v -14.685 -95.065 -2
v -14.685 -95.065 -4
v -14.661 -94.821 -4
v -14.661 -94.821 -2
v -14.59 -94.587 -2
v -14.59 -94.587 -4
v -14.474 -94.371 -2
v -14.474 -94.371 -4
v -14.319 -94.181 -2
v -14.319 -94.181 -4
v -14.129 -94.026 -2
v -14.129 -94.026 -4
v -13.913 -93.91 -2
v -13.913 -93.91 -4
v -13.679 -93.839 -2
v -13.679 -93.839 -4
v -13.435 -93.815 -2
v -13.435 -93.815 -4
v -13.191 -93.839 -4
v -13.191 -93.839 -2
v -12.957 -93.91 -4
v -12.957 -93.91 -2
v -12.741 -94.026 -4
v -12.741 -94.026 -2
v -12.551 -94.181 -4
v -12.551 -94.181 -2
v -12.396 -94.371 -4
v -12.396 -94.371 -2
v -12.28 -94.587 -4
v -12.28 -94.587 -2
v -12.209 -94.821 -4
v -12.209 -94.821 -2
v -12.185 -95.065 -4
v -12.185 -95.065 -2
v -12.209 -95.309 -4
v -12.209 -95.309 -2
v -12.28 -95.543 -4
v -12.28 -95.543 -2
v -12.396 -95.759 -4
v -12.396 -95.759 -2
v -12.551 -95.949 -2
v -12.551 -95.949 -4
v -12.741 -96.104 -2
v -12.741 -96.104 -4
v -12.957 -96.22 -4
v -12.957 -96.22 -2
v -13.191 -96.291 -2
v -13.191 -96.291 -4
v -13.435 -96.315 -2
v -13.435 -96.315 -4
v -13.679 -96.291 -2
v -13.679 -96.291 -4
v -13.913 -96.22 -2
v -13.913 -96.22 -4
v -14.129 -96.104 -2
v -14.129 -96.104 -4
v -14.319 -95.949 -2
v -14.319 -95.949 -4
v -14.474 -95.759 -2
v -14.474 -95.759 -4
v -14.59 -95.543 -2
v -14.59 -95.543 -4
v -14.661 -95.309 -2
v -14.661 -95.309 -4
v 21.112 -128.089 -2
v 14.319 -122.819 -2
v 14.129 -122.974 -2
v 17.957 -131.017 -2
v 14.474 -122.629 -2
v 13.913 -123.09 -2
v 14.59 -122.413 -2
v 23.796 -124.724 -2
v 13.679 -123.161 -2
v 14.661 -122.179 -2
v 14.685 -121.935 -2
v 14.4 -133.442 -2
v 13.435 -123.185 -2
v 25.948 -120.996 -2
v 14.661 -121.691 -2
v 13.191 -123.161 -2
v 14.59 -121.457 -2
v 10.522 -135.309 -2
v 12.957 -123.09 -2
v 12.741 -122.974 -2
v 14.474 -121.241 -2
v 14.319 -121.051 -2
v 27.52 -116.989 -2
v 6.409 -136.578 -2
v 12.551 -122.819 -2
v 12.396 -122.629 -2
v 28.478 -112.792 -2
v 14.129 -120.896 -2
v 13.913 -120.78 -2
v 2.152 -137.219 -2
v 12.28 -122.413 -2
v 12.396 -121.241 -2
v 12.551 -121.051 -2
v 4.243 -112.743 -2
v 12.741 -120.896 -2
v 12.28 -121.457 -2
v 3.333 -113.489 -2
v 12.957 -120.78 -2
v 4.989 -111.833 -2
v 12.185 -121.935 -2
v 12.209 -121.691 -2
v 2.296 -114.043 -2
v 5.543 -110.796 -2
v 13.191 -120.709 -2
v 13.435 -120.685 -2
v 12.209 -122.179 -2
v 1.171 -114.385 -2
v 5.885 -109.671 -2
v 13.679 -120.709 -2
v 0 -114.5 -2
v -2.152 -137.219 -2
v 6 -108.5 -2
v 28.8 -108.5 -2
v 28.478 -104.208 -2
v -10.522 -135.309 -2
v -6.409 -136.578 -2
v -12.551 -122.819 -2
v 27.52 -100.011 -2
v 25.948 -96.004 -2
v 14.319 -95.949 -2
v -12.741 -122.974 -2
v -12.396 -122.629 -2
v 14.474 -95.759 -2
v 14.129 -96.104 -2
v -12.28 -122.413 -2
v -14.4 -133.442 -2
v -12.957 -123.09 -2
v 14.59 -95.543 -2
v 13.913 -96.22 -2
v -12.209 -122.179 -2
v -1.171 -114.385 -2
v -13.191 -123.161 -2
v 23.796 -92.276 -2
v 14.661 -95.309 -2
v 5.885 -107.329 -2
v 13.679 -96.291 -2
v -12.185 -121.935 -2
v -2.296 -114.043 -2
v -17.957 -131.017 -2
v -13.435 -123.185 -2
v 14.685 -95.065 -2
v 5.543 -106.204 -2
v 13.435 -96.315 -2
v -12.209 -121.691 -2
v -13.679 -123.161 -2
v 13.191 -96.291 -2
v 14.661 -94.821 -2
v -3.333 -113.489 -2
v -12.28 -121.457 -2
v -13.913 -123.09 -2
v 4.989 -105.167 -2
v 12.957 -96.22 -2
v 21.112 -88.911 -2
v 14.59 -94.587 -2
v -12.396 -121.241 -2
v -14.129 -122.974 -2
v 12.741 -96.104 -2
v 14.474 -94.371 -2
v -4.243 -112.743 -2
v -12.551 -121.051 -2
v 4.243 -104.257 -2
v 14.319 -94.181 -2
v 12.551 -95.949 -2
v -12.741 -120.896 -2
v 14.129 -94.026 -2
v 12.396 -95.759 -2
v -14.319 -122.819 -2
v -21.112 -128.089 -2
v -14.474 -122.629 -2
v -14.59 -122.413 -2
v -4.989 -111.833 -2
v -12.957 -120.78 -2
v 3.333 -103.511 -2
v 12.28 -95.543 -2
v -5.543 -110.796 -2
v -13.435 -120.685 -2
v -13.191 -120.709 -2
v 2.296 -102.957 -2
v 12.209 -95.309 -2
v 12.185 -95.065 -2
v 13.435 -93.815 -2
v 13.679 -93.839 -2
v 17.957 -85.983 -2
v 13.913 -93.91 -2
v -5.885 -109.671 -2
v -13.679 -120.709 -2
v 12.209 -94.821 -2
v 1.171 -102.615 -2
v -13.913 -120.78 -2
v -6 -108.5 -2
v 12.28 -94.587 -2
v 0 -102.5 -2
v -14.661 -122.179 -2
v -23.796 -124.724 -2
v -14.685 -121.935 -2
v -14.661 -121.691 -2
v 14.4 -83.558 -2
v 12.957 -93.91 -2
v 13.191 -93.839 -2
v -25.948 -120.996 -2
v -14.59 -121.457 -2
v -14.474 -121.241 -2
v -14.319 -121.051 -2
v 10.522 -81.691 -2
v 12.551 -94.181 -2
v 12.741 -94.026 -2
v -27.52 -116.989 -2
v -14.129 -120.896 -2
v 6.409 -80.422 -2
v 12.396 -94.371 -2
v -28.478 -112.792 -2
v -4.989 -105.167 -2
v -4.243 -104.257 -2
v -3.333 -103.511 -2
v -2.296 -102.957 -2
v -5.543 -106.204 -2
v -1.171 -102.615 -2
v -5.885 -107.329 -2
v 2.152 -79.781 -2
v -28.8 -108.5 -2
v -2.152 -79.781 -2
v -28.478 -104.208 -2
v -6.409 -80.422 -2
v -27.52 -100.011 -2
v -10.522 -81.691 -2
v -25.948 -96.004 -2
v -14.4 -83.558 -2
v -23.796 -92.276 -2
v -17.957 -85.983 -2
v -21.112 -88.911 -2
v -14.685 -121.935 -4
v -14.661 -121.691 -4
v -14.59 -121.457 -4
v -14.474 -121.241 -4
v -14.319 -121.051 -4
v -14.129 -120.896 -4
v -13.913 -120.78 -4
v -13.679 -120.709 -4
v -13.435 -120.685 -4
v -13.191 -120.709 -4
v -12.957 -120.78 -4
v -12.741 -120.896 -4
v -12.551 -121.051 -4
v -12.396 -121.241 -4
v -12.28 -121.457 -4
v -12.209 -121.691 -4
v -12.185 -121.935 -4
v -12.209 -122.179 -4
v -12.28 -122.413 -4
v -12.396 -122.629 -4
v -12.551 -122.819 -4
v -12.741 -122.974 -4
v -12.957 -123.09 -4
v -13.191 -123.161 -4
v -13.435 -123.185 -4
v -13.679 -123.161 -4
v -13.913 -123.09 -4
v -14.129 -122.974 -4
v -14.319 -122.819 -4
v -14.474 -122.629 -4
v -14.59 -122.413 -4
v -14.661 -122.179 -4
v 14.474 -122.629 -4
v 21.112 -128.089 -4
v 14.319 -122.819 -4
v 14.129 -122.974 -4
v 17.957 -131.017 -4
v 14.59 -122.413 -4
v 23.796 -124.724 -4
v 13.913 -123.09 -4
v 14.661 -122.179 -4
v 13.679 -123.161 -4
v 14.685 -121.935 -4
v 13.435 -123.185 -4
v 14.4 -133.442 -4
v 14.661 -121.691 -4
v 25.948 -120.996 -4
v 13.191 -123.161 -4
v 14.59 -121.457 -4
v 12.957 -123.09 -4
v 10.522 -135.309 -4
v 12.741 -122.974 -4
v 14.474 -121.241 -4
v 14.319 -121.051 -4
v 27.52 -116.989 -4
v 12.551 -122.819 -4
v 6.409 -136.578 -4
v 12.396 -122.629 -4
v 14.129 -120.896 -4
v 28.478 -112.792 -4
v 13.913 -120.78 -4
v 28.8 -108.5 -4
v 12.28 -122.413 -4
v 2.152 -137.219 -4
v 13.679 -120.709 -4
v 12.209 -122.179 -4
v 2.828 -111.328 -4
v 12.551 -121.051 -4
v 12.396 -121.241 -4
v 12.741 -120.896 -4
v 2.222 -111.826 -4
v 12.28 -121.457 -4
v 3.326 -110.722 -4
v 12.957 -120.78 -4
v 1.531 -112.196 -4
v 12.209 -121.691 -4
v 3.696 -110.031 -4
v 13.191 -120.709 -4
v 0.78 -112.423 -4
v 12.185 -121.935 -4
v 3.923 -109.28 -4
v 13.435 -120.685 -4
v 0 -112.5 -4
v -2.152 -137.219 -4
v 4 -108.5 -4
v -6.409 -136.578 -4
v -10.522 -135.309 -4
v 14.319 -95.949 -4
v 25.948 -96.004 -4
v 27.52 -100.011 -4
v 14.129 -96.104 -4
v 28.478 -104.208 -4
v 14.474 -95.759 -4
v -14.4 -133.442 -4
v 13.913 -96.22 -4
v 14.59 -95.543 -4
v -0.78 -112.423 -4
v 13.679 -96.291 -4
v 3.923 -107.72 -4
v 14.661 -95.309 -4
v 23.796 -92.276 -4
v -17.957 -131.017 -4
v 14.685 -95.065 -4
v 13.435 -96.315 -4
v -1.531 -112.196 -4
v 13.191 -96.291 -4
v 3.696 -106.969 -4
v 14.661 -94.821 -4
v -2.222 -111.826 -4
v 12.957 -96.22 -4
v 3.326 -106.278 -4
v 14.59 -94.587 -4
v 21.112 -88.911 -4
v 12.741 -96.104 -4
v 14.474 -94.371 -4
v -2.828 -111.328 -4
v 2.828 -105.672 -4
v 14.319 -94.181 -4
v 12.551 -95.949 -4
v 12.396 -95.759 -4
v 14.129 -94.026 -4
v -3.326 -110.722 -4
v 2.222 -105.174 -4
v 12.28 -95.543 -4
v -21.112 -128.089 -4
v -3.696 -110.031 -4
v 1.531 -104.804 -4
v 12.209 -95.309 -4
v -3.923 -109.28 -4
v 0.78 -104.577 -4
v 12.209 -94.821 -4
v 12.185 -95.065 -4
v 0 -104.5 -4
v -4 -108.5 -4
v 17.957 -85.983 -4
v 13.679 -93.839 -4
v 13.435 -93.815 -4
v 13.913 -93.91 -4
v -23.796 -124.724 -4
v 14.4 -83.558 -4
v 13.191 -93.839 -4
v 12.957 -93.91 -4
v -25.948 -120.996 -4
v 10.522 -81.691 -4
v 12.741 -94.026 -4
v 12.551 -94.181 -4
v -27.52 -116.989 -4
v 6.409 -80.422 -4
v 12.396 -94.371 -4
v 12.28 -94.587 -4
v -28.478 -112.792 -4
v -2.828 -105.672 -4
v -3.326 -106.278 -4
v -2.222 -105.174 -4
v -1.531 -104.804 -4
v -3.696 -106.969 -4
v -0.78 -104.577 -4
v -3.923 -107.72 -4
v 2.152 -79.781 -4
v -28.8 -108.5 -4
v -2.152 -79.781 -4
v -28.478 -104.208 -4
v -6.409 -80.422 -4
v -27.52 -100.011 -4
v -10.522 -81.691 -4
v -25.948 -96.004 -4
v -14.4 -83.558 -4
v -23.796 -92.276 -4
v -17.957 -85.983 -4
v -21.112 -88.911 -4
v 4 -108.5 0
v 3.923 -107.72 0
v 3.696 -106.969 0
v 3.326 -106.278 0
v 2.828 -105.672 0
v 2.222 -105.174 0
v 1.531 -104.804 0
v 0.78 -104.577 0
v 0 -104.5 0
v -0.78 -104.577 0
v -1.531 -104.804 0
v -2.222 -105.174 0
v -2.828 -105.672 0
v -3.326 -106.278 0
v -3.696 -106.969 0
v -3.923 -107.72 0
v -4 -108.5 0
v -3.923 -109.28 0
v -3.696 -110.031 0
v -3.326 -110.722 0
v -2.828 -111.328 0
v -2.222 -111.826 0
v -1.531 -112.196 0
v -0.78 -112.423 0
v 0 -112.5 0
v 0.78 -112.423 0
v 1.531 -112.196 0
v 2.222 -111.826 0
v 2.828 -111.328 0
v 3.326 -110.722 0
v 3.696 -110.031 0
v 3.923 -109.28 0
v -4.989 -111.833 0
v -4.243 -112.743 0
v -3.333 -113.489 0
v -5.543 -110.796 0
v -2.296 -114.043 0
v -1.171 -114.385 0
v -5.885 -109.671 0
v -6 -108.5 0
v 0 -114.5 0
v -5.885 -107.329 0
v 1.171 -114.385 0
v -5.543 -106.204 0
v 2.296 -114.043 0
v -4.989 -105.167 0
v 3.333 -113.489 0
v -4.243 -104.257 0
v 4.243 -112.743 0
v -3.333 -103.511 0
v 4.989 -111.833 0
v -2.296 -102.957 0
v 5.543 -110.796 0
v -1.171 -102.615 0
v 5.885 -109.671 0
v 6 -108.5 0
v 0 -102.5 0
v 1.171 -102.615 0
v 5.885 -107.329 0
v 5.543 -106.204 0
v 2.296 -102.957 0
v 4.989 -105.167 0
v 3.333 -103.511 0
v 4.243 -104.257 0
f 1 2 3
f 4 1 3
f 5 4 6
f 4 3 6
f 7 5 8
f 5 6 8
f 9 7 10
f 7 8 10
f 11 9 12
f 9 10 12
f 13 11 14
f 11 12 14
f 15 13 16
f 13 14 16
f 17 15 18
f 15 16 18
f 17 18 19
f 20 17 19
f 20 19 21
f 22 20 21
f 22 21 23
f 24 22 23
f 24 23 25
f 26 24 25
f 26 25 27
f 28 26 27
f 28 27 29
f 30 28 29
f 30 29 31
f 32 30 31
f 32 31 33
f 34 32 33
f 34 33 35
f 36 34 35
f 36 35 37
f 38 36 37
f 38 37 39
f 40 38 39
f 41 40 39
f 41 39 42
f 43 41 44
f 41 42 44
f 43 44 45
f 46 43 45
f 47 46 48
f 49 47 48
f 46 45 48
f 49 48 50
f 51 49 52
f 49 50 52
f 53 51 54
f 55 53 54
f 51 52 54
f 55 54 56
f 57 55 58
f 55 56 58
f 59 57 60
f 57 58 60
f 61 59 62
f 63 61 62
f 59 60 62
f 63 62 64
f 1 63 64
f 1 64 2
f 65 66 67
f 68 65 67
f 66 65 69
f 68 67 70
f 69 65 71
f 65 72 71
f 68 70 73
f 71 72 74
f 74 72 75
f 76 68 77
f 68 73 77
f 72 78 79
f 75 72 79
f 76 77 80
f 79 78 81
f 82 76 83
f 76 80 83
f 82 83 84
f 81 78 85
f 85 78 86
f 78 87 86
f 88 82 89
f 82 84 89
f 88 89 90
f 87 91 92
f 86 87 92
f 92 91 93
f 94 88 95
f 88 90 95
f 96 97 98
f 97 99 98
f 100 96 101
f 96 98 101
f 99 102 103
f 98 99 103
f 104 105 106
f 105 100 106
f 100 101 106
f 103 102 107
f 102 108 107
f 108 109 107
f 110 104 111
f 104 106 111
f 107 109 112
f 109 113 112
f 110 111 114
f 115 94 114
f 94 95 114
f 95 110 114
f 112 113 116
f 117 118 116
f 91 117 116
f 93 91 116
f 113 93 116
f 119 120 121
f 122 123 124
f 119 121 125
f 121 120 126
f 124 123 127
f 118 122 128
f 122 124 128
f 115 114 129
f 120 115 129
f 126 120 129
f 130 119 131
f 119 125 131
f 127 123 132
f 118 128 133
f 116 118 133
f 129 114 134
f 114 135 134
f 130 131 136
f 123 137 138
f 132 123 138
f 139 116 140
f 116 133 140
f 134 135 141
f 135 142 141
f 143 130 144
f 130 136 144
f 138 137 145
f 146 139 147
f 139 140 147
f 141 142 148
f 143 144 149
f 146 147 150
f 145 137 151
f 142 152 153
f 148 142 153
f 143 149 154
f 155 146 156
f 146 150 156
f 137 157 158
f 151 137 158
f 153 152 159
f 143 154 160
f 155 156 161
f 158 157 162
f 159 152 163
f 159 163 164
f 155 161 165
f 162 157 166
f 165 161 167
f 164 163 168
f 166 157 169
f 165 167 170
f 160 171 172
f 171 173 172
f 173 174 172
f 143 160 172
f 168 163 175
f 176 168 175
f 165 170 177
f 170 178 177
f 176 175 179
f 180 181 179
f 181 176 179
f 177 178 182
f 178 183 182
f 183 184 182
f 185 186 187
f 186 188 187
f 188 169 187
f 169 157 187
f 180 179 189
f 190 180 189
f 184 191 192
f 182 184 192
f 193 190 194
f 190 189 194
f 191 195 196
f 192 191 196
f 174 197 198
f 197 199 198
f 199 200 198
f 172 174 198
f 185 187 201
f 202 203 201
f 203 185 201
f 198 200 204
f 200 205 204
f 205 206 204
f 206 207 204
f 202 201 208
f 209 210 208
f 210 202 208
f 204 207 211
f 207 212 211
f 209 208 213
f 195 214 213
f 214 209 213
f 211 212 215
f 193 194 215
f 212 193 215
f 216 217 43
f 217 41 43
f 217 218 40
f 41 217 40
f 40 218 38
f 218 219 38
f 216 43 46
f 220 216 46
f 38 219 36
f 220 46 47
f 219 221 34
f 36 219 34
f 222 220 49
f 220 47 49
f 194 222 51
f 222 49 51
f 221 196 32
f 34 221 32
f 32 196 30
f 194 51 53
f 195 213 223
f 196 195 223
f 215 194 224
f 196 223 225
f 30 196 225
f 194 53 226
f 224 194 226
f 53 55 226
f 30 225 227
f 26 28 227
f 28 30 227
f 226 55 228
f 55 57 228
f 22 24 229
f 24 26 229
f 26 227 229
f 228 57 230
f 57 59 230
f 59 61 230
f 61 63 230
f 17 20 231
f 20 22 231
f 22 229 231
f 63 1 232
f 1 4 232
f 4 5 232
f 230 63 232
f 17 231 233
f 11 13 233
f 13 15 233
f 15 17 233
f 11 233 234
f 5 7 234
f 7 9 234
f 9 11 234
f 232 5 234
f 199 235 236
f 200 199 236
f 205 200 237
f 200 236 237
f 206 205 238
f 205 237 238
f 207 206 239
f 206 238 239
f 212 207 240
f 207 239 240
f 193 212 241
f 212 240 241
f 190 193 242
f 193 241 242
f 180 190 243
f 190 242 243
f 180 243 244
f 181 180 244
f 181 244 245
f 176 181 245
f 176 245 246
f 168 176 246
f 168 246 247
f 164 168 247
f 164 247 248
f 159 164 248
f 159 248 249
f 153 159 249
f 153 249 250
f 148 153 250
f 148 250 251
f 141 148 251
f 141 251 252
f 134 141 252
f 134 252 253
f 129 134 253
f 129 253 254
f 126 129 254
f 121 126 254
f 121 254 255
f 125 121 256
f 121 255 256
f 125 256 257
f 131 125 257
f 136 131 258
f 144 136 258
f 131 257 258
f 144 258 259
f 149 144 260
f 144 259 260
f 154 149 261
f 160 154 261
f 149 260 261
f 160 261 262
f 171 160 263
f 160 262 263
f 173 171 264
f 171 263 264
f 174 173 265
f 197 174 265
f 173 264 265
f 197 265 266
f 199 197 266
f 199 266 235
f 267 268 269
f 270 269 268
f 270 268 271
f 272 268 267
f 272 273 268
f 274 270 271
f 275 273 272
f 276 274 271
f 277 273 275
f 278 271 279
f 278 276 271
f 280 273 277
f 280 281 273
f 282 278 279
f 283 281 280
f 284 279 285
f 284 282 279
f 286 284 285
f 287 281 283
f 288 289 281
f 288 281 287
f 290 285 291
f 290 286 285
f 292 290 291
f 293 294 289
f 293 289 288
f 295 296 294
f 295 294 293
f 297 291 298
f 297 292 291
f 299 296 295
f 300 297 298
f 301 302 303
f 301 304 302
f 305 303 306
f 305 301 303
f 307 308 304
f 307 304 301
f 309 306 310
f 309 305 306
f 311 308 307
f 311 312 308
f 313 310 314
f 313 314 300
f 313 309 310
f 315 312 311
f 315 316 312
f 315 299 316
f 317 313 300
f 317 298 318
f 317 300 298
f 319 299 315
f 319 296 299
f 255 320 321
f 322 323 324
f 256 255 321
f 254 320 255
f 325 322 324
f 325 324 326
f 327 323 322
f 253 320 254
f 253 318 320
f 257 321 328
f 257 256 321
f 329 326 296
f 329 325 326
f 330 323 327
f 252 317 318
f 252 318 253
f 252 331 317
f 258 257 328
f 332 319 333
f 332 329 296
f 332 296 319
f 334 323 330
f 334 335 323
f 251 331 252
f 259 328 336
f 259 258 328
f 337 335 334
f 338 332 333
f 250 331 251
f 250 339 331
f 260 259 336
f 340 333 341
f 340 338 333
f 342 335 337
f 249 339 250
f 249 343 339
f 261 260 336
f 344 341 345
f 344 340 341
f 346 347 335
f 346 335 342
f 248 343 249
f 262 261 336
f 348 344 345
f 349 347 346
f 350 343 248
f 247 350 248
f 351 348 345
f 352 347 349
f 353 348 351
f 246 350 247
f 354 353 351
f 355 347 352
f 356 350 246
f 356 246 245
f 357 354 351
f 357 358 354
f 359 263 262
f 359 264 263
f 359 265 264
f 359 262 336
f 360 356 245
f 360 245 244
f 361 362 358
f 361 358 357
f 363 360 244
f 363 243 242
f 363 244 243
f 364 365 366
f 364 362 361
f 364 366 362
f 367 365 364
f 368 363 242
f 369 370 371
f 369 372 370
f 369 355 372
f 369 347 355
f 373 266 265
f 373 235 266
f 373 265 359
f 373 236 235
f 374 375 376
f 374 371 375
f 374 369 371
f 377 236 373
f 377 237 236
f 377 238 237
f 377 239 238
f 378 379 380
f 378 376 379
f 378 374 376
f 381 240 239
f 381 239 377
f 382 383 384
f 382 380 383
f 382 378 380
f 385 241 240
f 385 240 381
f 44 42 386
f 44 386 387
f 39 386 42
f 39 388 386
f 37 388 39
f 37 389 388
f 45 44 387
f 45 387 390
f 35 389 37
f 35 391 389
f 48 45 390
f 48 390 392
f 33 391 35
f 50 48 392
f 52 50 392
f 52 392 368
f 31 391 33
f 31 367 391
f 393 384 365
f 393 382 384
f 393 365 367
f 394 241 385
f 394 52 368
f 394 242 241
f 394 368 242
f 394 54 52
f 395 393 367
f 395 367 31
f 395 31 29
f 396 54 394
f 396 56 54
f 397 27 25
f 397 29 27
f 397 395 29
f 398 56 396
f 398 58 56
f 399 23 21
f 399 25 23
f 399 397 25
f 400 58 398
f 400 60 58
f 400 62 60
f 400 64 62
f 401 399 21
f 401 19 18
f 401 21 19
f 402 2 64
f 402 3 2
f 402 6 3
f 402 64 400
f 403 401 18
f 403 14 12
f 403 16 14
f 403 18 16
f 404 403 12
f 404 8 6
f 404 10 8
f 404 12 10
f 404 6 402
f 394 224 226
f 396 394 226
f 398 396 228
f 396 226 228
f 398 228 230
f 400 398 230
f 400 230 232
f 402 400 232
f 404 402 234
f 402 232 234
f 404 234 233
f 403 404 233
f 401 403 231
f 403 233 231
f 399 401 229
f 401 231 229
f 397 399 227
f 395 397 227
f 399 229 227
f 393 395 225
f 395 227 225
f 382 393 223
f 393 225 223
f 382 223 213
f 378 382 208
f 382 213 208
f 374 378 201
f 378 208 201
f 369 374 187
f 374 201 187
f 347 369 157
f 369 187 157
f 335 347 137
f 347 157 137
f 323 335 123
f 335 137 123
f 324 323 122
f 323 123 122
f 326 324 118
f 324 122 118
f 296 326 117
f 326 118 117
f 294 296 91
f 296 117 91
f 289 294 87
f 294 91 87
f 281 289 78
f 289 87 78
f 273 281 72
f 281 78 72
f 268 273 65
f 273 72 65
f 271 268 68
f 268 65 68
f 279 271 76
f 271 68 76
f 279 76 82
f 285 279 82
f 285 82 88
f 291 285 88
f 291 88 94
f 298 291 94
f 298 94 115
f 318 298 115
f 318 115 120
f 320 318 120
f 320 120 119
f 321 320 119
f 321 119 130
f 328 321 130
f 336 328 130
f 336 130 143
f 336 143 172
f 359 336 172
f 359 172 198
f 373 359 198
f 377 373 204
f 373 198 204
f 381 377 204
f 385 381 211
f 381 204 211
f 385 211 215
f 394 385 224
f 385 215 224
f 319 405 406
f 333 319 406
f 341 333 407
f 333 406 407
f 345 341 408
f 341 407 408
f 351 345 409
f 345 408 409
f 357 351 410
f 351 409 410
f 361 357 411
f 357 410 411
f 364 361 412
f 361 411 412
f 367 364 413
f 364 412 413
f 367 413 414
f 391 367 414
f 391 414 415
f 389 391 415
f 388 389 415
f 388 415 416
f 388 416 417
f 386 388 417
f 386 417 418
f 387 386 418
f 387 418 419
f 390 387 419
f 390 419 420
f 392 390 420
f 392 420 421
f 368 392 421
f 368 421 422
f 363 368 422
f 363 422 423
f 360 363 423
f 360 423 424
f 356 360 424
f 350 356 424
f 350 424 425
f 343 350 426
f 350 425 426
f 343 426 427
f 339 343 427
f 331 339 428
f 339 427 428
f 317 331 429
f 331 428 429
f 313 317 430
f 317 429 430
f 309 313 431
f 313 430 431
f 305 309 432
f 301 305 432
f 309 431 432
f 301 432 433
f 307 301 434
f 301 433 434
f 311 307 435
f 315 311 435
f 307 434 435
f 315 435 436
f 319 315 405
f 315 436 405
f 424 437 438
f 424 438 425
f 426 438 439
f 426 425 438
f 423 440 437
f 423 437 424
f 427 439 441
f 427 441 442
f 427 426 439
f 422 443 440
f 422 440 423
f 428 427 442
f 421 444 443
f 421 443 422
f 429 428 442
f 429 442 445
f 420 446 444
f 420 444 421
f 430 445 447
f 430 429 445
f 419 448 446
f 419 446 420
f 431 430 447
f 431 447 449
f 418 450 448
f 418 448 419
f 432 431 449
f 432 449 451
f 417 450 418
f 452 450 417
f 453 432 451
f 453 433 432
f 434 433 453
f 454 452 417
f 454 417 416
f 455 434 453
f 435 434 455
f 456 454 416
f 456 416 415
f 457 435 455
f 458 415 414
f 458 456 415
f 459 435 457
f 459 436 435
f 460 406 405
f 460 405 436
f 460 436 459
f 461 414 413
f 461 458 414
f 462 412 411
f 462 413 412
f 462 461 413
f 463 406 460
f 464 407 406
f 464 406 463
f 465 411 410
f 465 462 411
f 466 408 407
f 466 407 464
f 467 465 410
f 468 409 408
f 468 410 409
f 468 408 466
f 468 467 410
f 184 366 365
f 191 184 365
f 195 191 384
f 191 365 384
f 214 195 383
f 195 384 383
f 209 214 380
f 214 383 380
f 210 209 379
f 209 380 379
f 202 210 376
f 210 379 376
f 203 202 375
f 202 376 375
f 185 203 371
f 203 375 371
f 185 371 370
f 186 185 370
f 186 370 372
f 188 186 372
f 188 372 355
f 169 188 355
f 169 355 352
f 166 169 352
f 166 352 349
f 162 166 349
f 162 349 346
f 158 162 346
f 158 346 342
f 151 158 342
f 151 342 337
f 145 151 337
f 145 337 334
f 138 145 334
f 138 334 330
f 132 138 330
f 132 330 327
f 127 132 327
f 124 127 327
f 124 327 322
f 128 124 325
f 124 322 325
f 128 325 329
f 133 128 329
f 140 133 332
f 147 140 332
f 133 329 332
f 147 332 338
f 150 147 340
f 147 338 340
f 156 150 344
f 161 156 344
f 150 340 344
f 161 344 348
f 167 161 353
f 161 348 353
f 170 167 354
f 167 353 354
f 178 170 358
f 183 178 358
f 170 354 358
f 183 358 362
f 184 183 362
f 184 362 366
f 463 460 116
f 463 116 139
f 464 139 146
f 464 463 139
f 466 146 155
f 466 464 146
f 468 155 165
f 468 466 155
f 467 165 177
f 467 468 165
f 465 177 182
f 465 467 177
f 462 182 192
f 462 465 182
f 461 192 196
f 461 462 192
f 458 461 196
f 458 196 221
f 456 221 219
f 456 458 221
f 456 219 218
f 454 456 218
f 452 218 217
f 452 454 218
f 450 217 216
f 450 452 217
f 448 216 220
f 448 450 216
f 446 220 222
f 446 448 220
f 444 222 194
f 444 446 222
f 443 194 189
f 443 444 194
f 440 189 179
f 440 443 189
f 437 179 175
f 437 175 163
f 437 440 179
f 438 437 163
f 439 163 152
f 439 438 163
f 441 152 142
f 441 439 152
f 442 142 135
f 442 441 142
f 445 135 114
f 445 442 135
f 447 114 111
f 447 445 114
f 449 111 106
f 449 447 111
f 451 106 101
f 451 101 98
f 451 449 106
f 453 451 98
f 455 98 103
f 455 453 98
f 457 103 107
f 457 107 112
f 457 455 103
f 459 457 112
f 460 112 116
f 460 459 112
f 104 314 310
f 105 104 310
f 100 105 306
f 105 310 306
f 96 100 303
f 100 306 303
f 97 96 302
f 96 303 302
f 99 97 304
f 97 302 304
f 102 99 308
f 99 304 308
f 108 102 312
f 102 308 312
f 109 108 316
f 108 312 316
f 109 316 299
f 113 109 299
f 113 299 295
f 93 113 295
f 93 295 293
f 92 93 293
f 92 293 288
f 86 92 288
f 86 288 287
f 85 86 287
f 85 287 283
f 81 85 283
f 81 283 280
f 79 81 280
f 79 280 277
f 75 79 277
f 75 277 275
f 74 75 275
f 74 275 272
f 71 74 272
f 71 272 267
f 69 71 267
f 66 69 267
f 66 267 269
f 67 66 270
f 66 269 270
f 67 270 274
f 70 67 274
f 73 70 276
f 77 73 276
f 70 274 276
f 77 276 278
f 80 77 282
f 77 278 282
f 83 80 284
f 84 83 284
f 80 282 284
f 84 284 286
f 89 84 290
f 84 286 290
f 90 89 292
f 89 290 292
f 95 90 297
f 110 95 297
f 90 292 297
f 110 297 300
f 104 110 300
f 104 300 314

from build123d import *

# Parameters (mm, degrees)
SKETCH1_R             = 6
BOSS_EXTRUDE1_DEPTH   = 2
SKETCH2_R             = 28.8
BOSS_EXTRUDE2_DEPTH   = 2
SKETCH3_R             = 4
CUT_EXTRUDE1_DEPTH    = 5
M3X0_5_TAPPED_HOLE1_D = 2.5


with BuildPart() as part:
    # Sketch1 → Boss-Extrude1 (new body)
    with BuildSketch(Plane.XY):
        with Locations((0, -108.5)):
            Circle(SKETCH1_R)
    extrude(amount=-BOSS_EXTRUDE1_DEPTH)

    # Sketch2 → Boss-Extrude2 (add)
    with BuildSketch(Plane(origin=(0, 0, -2), x_dir=(-1, 0, 0), z_dir=(0, 0, -1))):
        with Locations((0, -108.5)):
            Circle(SKETCH2_R)
    extrude(amount=BOSS_EXTRUDE2_DEPTH)

    # Sketch3 → Cut-Extrude1 (cut, through all)
    with BuildSketch(Plane.XY):
        with Locations((0, -108.5)):
            Circle(SKETCH3_R)
    extrude(amount=-CUT_EXTRUDE1_DEPTH, mode=Mode.SUBTRACT)

    # M3x0.5 Tapped Hole1 (through all)
    with Locations(Plane.XY.offset(-2)):
        with Locations((-13.435028843, -95.064971157), (13.435028843, -95.064971157), (13.435028843, -121.935028843), (-13.435028843, -121.935028843)):
            Hole(M3X0_5_TAPPED_HOLE1_D / 2)


solid = part.part
